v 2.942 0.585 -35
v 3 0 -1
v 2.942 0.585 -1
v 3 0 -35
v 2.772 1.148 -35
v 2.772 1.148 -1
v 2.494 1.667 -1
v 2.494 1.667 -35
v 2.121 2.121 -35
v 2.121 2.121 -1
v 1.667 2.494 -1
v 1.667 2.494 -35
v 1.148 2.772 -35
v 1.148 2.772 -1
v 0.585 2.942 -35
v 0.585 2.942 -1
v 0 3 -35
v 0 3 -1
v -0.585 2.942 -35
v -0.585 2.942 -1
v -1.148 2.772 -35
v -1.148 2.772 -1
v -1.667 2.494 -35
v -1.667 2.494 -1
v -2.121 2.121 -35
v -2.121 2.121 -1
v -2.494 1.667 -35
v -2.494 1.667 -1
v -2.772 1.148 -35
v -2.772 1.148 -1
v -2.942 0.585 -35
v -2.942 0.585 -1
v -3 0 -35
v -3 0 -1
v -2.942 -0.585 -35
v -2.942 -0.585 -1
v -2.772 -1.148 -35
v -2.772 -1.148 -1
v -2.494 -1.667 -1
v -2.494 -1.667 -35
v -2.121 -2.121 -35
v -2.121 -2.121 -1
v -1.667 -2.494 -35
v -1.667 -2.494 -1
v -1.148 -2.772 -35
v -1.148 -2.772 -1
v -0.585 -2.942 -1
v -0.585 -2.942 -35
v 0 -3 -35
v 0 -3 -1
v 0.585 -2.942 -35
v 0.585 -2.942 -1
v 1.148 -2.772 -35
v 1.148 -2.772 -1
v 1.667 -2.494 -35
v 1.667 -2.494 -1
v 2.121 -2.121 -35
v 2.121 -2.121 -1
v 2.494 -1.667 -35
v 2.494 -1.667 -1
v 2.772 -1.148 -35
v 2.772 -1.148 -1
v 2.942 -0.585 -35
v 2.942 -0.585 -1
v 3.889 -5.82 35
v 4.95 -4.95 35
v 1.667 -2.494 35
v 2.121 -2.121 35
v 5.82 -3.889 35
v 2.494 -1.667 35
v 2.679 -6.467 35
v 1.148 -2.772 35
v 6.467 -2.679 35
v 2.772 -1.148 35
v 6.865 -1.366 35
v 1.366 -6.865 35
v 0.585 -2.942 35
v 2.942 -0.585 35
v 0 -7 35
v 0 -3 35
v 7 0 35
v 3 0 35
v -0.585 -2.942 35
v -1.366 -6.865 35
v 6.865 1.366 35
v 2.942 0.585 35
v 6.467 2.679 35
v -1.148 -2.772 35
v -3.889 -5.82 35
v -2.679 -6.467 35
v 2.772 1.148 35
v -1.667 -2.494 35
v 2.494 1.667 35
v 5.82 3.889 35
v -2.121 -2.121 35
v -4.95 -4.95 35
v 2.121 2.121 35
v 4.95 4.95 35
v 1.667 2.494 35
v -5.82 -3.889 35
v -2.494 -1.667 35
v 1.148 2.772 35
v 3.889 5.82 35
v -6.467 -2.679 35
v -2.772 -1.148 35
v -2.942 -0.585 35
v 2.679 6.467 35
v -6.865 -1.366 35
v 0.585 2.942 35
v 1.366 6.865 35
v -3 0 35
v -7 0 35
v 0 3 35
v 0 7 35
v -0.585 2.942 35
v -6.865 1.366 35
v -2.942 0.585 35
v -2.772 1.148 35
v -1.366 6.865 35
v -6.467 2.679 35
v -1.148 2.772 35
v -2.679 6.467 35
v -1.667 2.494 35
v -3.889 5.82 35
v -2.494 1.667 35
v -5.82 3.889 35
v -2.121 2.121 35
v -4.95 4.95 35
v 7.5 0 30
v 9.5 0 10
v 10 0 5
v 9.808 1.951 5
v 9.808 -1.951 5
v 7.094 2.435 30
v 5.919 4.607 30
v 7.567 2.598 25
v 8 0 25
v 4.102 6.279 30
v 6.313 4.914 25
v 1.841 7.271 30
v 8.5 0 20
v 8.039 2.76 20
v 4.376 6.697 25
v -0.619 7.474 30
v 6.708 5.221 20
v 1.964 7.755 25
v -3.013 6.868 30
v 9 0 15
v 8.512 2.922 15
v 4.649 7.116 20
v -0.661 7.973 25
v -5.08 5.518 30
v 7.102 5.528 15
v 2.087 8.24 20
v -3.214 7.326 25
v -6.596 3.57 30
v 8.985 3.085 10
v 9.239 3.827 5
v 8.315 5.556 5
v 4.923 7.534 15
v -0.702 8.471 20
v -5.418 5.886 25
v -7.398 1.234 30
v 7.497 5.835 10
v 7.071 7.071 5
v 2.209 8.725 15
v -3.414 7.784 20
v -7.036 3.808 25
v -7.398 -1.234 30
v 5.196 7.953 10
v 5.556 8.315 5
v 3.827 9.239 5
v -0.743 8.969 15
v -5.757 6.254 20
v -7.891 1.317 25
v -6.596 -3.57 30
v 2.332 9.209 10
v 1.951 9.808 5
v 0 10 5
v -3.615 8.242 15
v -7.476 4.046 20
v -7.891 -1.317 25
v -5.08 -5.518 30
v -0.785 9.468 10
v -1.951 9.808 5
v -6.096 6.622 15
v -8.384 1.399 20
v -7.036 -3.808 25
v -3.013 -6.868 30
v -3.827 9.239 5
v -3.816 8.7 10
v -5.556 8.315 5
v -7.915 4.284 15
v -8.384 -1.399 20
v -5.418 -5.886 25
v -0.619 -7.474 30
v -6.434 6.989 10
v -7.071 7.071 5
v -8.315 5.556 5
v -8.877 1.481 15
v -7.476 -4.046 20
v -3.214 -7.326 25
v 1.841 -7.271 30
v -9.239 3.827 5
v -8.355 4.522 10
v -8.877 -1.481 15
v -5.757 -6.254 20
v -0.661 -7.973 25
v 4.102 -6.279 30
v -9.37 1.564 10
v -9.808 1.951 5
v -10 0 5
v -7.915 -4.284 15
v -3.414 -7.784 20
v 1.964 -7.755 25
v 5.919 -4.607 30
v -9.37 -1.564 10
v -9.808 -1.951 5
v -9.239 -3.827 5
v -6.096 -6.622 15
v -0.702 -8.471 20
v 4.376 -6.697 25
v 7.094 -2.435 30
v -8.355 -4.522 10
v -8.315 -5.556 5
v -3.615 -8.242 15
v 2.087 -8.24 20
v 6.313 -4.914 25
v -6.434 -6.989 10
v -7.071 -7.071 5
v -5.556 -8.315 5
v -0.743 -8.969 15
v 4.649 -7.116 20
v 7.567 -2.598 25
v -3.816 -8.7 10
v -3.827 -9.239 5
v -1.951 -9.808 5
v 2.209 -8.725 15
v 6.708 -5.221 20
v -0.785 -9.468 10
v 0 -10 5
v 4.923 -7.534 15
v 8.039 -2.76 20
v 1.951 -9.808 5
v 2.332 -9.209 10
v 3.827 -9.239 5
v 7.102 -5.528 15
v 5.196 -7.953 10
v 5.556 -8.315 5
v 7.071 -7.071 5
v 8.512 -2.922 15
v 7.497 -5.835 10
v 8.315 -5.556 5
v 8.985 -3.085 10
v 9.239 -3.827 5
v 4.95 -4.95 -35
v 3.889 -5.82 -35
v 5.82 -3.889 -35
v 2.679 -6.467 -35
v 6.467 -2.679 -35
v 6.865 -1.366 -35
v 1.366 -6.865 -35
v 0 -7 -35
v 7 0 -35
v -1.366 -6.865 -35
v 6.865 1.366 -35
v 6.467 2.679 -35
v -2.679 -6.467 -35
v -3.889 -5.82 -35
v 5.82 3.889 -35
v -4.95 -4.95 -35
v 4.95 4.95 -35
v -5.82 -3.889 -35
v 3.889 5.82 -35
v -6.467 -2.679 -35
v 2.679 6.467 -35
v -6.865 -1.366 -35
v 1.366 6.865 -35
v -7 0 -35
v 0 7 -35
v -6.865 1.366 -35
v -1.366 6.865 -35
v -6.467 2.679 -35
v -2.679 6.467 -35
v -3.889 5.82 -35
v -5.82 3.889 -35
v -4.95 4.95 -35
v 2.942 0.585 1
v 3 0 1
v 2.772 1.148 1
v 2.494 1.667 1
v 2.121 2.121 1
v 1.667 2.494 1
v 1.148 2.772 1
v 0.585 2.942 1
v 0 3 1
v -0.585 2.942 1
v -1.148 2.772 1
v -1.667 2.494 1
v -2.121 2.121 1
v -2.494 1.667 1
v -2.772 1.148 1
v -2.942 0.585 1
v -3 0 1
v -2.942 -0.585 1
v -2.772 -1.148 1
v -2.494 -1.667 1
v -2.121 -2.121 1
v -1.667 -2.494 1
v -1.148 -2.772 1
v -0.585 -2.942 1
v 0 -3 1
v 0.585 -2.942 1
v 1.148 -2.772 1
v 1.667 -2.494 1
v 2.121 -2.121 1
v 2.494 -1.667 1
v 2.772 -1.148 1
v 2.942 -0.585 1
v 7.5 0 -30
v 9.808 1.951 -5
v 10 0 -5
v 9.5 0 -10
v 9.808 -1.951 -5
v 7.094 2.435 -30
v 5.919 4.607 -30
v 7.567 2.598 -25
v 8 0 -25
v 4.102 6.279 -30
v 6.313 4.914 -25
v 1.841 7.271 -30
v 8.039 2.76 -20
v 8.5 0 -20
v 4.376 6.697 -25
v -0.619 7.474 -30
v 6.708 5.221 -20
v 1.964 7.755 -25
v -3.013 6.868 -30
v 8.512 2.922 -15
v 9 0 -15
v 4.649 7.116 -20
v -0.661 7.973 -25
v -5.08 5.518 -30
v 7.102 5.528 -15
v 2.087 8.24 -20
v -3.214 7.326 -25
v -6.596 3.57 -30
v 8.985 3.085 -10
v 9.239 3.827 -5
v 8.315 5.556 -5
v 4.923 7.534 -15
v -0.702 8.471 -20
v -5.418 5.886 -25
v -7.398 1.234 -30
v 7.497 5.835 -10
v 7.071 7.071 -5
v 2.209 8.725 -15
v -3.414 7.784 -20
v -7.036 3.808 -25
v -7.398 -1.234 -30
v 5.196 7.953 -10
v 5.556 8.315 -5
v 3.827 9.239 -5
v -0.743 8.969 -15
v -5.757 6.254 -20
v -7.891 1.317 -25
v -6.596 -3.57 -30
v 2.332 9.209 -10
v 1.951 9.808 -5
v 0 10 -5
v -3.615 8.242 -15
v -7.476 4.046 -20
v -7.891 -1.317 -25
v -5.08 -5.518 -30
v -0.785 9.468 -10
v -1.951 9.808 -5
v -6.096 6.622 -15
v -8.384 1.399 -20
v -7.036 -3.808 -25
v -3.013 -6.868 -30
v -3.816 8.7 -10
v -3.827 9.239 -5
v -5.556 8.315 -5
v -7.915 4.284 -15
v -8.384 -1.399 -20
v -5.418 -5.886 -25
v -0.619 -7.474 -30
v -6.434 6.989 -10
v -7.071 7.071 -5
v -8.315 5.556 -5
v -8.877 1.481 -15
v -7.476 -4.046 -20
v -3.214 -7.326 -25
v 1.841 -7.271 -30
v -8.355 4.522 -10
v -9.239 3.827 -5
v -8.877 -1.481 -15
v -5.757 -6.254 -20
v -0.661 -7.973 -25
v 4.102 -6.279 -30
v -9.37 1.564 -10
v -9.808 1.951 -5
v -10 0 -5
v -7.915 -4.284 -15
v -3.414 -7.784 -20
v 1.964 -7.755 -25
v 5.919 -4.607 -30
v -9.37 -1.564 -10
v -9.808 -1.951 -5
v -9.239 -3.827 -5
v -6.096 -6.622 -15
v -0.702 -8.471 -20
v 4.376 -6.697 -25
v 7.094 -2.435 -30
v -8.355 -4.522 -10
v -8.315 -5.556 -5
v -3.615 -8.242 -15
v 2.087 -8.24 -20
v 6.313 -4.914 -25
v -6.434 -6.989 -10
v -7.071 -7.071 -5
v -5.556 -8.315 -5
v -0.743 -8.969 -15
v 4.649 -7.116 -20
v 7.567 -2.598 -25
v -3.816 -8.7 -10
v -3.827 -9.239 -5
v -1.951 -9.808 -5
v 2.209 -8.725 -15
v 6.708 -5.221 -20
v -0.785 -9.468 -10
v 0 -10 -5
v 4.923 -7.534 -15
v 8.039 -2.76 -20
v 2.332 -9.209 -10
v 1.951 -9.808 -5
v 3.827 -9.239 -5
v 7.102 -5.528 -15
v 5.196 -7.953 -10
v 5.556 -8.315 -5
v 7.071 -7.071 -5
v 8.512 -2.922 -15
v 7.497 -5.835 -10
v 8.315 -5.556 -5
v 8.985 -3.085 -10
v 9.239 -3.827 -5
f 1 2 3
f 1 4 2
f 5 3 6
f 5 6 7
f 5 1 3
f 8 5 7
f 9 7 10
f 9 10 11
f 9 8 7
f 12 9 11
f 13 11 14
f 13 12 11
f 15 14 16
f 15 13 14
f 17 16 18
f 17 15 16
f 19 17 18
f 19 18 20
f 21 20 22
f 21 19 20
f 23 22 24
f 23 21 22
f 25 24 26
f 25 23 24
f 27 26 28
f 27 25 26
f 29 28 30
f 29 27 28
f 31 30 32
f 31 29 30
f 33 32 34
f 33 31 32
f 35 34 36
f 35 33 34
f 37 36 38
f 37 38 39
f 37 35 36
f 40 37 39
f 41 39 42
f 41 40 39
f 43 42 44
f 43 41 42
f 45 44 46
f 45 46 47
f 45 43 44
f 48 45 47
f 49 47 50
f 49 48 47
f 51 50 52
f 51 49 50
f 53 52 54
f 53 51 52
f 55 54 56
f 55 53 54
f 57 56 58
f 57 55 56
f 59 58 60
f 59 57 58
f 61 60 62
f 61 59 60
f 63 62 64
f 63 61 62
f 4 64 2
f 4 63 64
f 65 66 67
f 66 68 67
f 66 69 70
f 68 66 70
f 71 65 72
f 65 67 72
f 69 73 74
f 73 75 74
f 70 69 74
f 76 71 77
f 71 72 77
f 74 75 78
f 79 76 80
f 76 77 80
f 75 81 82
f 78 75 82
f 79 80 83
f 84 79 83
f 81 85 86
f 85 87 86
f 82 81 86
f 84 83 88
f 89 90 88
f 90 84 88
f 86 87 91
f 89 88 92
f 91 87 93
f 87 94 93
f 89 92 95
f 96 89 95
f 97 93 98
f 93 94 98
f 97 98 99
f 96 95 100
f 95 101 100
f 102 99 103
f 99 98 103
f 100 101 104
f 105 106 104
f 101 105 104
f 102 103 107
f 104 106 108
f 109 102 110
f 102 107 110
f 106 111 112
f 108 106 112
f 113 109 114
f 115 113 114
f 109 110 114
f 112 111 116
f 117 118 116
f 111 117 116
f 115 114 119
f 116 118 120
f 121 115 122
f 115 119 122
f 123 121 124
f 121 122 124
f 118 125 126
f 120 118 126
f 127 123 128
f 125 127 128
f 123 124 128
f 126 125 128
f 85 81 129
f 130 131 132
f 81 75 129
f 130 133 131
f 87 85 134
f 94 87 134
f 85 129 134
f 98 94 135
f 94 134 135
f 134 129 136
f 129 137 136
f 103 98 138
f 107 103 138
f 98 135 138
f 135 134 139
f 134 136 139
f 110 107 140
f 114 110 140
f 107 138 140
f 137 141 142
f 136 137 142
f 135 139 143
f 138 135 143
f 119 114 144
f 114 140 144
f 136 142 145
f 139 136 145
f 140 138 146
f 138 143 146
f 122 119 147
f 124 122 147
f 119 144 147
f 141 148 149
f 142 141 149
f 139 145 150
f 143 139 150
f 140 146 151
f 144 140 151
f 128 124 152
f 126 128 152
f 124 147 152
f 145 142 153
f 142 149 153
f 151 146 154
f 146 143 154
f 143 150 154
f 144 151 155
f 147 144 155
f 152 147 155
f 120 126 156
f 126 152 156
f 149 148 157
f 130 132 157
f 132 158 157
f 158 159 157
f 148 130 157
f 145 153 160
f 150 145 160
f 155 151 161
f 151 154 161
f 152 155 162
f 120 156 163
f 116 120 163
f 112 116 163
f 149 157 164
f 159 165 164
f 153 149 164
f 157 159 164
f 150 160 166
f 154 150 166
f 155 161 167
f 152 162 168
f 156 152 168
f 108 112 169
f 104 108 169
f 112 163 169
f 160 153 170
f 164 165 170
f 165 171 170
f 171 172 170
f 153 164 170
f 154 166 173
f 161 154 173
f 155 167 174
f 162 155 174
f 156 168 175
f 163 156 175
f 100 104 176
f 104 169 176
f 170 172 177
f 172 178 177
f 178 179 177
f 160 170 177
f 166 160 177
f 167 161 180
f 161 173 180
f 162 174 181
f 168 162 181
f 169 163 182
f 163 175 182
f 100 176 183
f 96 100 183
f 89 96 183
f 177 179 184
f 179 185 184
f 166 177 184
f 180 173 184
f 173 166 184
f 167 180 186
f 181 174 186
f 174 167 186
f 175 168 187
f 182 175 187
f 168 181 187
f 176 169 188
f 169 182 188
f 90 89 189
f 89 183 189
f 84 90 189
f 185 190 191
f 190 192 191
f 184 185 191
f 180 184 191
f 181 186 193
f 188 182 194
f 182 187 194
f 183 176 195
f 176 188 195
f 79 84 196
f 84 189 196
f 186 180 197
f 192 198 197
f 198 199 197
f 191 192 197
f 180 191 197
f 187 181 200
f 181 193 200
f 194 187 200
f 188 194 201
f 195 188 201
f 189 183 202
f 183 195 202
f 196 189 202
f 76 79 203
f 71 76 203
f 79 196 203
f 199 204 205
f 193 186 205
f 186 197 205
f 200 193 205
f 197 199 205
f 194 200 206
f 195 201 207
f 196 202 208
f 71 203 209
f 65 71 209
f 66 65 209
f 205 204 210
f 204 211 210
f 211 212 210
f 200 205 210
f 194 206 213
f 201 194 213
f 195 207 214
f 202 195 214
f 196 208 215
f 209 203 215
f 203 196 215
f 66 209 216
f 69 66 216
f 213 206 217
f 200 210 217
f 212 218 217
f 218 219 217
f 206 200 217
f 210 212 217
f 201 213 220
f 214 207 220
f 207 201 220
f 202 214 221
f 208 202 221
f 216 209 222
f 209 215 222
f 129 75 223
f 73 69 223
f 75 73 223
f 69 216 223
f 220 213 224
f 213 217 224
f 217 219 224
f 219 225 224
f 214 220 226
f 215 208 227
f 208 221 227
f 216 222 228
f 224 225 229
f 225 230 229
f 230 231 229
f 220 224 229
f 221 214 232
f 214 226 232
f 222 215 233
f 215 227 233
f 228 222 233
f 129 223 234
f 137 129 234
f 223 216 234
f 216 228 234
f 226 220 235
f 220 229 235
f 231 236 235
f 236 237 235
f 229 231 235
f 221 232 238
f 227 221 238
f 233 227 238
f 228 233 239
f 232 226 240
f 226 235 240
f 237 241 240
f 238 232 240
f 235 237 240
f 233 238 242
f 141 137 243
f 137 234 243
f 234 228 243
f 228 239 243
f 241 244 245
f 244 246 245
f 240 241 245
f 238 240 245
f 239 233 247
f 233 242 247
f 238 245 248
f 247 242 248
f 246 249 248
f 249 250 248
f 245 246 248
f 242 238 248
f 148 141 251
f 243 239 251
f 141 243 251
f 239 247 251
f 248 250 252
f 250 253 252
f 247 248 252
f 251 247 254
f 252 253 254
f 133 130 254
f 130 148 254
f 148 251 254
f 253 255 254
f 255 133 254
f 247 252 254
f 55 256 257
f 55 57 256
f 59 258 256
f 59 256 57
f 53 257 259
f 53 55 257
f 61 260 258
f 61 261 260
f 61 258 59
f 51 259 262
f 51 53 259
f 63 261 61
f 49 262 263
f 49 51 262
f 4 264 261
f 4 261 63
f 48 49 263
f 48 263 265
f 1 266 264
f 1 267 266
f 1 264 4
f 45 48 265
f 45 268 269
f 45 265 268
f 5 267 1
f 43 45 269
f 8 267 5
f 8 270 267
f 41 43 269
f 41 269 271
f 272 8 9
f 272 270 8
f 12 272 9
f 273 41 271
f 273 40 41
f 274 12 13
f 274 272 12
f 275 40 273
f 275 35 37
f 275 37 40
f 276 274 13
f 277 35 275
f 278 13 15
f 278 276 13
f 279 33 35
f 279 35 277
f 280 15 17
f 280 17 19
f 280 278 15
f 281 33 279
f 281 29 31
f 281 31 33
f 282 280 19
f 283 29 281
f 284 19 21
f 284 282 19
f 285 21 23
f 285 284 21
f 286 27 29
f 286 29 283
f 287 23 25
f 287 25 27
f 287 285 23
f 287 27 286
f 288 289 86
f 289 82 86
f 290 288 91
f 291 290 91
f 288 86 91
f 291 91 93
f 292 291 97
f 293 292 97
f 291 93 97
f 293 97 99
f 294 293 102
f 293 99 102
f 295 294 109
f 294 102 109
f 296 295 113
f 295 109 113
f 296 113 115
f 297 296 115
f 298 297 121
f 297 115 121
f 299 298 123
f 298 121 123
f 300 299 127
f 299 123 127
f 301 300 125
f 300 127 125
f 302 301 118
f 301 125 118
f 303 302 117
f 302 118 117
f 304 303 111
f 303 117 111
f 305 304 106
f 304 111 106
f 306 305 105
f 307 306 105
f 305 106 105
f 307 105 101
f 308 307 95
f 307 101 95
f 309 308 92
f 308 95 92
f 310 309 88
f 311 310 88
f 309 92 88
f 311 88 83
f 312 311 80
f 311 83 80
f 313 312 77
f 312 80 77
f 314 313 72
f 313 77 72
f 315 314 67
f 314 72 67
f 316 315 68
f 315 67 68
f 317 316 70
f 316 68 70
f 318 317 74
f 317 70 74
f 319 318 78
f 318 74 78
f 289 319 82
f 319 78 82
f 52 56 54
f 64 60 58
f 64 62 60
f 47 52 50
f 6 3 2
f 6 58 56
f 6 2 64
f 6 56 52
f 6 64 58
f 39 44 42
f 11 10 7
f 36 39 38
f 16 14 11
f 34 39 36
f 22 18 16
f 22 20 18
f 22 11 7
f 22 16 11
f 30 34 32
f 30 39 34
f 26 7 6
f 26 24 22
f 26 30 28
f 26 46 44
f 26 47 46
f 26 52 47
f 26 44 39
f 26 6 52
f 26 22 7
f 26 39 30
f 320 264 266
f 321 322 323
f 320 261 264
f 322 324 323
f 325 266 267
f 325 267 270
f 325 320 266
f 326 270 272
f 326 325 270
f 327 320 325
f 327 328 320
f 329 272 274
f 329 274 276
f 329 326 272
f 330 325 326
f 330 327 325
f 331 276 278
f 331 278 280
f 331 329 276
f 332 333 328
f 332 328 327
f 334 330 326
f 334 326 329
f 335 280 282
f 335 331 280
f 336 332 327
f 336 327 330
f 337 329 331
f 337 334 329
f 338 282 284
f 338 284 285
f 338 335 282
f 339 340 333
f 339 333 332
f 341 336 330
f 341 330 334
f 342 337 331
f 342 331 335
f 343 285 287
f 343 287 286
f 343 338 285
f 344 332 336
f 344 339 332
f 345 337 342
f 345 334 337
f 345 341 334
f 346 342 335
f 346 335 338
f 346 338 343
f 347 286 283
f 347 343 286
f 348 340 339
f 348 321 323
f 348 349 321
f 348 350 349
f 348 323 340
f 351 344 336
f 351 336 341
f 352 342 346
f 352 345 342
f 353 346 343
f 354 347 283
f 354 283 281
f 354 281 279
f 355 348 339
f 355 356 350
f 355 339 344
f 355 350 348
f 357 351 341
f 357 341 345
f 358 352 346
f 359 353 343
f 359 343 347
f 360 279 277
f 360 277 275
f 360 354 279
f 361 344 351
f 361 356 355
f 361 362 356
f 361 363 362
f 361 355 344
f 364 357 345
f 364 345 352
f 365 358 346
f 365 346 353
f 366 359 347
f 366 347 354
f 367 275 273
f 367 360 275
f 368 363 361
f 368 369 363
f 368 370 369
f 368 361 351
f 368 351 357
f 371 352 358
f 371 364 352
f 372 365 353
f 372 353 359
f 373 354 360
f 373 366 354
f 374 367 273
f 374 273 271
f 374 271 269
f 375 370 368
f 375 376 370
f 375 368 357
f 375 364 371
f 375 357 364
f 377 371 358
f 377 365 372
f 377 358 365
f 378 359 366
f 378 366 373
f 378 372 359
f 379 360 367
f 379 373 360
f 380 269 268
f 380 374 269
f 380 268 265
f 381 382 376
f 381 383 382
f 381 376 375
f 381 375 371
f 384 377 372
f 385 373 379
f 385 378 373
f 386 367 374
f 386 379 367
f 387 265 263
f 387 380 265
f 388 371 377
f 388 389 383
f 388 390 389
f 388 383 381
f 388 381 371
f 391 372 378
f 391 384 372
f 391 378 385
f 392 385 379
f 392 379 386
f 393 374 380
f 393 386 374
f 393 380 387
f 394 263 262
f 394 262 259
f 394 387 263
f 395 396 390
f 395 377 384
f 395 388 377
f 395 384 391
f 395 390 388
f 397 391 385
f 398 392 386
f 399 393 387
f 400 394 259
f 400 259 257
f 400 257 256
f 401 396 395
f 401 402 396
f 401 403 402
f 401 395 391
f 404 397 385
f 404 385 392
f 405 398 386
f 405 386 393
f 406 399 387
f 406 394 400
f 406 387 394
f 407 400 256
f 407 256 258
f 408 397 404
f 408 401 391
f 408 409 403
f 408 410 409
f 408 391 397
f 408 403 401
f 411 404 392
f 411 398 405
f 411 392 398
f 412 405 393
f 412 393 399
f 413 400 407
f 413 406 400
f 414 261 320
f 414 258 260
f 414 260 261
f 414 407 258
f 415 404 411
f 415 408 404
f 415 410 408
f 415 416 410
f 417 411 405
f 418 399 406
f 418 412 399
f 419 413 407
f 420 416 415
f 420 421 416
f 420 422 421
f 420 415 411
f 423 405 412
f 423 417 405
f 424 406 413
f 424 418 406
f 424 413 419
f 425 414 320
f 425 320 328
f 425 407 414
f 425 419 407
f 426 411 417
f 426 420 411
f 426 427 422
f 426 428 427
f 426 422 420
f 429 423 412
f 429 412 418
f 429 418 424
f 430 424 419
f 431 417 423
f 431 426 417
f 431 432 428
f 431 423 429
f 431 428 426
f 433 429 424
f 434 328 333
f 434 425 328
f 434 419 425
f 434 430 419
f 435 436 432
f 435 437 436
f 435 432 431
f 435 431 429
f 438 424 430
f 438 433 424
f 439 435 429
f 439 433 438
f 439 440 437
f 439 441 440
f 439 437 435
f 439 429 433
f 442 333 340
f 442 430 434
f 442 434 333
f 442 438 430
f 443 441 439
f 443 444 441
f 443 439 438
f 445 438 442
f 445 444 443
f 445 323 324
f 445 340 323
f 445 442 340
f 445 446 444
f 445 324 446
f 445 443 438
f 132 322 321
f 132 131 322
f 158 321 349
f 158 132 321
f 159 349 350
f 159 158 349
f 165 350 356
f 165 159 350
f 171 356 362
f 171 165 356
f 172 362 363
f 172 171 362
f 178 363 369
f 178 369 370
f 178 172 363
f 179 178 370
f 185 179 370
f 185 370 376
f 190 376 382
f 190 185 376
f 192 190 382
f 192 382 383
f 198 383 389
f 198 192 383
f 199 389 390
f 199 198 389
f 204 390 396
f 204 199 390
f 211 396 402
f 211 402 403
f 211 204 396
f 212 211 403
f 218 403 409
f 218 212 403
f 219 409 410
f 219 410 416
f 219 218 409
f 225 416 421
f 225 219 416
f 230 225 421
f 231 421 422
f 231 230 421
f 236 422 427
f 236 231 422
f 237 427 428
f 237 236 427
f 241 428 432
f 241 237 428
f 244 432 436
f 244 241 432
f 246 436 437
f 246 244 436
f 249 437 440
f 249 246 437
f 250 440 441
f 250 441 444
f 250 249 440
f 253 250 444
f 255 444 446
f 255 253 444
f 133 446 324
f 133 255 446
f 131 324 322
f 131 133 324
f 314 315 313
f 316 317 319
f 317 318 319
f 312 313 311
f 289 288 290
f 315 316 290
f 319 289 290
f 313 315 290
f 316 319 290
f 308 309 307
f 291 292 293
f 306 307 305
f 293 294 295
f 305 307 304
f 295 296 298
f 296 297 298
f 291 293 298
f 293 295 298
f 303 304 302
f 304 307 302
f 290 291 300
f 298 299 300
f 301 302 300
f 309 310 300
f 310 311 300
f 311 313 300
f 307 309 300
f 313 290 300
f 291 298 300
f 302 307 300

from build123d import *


with BuildPart() as part:
    # Sketch → Revolution (revolve)
    with BuildSketch(Plane.XZ):
        Polygon((3, 35), (7, 35), (10, 5), (10, 0), (0, 0), (0, 1), (3, 1), align=None)
    revolution = revolve(axis=Axis((0, 0, 0), (0, 0, 1)))

    # Mirrored: Revolution across Sketch H_Axis
    add(revolution.mirror(Plane(origin=(0, 0, 0), x_dir=(0, -1, 0), z_dir=(0, 0, 1))))


solid = part.part
